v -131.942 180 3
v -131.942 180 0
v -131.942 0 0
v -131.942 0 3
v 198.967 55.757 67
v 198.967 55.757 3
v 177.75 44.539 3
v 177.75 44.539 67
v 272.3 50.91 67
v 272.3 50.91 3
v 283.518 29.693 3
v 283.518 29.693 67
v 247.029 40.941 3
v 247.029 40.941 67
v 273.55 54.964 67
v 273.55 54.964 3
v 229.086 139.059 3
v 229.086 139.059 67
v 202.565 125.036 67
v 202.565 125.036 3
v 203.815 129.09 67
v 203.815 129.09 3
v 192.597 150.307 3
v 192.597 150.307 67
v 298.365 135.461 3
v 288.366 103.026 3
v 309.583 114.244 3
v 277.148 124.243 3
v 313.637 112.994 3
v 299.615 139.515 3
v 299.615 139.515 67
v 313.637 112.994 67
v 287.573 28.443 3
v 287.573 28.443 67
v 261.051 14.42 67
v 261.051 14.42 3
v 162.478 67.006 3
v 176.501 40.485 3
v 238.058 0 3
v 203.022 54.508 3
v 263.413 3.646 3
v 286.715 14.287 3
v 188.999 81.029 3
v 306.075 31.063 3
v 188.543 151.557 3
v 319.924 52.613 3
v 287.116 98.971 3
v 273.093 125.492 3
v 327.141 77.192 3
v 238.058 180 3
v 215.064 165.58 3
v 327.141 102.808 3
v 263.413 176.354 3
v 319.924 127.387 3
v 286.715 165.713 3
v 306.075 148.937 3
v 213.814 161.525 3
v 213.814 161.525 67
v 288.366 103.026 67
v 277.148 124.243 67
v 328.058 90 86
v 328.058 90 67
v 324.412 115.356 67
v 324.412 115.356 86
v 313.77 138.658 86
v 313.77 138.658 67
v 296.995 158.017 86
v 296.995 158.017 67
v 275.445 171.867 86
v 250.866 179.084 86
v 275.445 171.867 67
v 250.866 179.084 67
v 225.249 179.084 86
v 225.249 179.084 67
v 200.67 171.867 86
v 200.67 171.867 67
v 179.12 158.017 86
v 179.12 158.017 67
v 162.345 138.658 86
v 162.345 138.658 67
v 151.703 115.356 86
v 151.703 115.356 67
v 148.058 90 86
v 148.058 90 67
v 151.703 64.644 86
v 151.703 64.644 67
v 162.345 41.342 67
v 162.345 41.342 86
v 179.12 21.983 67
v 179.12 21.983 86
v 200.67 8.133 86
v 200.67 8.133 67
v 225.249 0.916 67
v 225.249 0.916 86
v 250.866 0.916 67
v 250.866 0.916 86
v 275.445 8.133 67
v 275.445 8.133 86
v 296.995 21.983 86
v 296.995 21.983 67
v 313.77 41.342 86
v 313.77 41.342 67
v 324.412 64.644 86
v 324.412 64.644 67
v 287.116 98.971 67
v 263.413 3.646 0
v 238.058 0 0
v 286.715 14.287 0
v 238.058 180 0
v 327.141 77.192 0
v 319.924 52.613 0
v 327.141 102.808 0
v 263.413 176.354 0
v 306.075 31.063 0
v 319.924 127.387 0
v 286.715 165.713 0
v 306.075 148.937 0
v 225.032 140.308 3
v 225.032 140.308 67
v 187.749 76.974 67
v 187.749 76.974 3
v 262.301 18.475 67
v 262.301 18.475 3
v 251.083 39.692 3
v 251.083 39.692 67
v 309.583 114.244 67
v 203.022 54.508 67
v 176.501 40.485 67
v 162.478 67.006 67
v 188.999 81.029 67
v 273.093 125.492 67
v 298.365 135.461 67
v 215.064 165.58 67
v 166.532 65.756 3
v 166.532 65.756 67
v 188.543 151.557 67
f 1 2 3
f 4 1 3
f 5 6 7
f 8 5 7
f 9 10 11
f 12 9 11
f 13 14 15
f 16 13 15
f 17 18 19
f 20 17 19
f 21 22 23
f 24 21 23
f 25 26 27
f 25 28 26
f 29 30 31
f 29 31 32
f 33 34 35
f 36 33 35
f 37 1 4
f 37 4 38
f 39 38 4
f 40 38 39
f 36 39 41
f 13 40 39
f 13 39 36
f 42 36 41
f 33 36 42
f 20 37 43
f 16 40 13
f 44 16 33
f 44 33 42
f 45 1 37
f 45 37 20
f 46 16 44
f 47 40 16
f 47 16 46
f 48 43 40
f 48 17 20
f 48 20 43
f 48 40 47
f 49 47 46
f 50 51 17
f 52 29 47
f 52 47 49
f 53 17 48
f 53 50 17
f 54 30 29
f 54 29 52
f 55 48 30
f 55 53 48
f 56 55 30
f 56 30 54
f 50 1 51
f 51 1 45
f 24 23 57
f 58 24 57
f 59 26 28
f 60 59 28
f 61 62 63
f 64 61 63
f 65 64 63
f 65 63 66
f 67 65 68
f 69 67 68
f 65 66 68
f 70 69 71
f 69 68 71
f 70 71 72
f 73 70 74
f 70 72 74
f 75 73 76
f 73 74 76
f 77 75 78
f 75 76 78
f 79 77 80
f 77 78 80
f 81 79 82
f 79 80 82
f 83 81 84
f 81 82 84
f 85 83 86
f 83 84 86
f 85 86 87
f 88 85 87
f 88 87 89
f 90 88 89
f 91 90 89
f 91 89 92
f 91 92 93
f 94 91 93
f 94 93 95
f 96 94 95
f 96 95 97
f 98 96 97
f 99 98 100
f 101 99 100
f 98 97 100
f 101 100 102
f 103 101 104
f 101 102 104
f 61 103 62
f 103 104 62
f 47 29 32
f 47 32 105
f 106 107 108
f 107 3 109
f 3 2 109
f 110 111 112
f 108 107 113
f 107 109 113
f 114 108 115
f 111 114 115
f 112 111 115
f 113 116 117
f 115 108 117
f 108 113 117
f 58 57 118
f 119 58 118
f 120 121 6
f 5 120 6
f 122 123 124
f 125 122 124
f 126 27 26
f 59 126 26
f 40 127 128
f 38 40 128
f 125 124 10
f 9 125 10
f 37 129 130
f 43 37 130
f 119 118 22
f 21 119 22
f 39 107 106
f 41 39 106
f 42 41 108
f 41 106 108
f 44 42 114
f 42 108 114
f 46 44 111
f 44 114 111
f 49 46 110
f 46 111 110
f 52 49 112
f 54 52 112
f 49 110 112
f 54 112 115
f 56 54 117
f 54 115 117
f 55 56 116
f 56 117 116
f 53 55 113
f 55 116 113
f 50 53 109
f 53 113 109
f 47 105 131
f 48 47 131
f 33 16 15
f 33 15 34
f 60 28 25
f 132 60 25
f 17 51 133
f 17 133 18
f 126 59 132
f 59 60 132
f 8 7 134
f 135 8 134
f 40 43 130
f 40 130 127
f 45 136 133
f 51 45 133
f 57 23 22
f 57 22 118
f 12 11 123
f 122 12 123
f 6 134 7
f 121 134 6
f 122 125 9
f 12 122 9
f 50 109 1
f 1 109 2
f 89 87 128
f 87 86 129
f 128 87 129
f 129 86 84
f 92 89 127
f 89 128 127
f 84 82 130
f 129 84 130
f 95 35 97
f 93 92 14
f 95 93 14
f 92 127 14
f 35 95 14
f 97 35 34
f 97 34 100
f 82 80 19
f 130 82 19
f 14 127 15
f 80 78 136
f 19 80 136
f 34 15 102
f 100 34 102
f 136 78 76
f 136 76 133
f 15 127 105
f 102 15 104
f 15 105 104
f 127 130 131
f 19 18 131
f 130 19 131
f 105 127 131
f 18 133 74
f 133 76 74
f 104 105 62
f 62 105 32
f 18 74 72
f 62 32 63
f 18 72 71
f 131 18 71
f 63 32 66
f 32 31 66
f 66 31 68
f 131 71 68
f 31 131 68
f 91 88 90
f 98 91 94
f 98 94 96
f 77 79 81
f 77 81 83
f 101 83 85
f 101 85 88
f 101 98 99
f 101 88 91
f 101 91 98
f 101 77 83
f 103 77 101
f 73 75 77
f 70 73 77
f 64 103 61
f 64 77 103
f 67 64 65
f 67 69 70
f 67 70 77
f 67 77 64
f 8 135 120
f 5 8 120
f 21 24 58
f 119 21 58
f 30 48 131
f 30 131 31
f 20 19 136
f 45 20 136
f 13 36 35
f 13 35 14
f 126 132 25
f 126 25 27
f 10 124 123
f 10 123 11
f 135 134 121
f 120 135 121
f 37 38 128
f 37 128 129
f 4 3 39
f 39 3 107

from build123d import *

# Parameters (mm, degrees)
BOSS_EXTRUDE1_DEPTH = 3
BOSS_EXTRUDE2_DEPTH = 64
SKETCH3_R           = 90
BOSS_EXTRUDE4_DEPTH = 19


with BuildPart() as part:
    # Sketch1 → Boss-Extrude1 (new body)
    with BuildSketch(Plane.XY):
        with BuildLine():
            Line((-131.94247797, 0), (238.05752203, 0))
            ThreePointArc((238.05752203, 0), (328.05752203, 90), (238.05752203, 180))
            Line((238.05752203, 180), (-131.94247797, 180))
            Line((-131.94247797, 180), (-131.94247797, 0))
        make_face()
    extrude(amount=BOSS_EXTRUDE1_DEPTH)

    # Sketch2 → Boss-Extrude2 (add)
    # profile 1 of 4: a face of its own
    with BuildSketch(Plane.XY.offset(3)):
        Polygon((203.021580666, 54.507604342), (176.500529327, 40.484985617), (162.477910603, 67.006036956), (188.998961942, 81.02865568), align=None)
        Polygon((177.750372588, 44.539352624), (166.532277609, 65.756193695), (187.74911868, 76.974288674), (198.967213659, 55.757447603), align=None, mode=Mode.SUBTRACT)
    # profile 2 of 4: a face of its own
    with BuildSketch(Plane.XY.offset(3)):
        Polygon((287.572536413, 28.443007297), (261.051485074, 14.420388572), (247.02886635, 40.941439911), (273.549917689, 54.964058635), align=None)
        Polygon((262.301328336, 18.474755579), (251.083233356, 39.69159665), (272.300074427, 50.909691629), (283.518169407, 29.692850558), align=None, mode=Mode.SUBTRACT)
    # profile 3 of 4: a face of its own
    with BuildSketch(Plane.XY.offset(3)):
        Polygon((299.614514734, 139.515014383), (313.637133458, 112.993963044), (287.116082119, 98.97134432), (273.093463395, 125.492395658), align=None)
        Polygon((309.582766452, 114.243806305), (288.365925381, 103.025711326), (277.147830401, 124.242552397), (298.364671472, 135.460647376), align=None, mode=Mode.SUBTRACT)
    # profile 4 of 4: a face of its own
    with BuildSketch(Plane.XY.offset(3)):
        Polygon((188.542507648, 151.556992703), (215.063558987, 165.579611428), (229.086177711, 139.058560089), (202.565126372, 125.035941365), align=None)
        Polygon((203.814969633, 129.090308371), (192.596874654, 150.307149442), (213.813715725, 161.525244421), (225.031810705, 140.30840335), align=None, mode=Mode.SUBTRACT)
    extrude(amount=BOSS_EXTRUDE2_DEPTH)

    # Sketch3 → Boss-Extrude4 (add)
    with BuildSketch(Plane.XY.offset(67)):
        with Locations((238.05752203, 90)):
            Circle(SKETCH3_R)
    extrude(amount=BOSS_EXTRUDE4_DEPTH)


solid = part.part
